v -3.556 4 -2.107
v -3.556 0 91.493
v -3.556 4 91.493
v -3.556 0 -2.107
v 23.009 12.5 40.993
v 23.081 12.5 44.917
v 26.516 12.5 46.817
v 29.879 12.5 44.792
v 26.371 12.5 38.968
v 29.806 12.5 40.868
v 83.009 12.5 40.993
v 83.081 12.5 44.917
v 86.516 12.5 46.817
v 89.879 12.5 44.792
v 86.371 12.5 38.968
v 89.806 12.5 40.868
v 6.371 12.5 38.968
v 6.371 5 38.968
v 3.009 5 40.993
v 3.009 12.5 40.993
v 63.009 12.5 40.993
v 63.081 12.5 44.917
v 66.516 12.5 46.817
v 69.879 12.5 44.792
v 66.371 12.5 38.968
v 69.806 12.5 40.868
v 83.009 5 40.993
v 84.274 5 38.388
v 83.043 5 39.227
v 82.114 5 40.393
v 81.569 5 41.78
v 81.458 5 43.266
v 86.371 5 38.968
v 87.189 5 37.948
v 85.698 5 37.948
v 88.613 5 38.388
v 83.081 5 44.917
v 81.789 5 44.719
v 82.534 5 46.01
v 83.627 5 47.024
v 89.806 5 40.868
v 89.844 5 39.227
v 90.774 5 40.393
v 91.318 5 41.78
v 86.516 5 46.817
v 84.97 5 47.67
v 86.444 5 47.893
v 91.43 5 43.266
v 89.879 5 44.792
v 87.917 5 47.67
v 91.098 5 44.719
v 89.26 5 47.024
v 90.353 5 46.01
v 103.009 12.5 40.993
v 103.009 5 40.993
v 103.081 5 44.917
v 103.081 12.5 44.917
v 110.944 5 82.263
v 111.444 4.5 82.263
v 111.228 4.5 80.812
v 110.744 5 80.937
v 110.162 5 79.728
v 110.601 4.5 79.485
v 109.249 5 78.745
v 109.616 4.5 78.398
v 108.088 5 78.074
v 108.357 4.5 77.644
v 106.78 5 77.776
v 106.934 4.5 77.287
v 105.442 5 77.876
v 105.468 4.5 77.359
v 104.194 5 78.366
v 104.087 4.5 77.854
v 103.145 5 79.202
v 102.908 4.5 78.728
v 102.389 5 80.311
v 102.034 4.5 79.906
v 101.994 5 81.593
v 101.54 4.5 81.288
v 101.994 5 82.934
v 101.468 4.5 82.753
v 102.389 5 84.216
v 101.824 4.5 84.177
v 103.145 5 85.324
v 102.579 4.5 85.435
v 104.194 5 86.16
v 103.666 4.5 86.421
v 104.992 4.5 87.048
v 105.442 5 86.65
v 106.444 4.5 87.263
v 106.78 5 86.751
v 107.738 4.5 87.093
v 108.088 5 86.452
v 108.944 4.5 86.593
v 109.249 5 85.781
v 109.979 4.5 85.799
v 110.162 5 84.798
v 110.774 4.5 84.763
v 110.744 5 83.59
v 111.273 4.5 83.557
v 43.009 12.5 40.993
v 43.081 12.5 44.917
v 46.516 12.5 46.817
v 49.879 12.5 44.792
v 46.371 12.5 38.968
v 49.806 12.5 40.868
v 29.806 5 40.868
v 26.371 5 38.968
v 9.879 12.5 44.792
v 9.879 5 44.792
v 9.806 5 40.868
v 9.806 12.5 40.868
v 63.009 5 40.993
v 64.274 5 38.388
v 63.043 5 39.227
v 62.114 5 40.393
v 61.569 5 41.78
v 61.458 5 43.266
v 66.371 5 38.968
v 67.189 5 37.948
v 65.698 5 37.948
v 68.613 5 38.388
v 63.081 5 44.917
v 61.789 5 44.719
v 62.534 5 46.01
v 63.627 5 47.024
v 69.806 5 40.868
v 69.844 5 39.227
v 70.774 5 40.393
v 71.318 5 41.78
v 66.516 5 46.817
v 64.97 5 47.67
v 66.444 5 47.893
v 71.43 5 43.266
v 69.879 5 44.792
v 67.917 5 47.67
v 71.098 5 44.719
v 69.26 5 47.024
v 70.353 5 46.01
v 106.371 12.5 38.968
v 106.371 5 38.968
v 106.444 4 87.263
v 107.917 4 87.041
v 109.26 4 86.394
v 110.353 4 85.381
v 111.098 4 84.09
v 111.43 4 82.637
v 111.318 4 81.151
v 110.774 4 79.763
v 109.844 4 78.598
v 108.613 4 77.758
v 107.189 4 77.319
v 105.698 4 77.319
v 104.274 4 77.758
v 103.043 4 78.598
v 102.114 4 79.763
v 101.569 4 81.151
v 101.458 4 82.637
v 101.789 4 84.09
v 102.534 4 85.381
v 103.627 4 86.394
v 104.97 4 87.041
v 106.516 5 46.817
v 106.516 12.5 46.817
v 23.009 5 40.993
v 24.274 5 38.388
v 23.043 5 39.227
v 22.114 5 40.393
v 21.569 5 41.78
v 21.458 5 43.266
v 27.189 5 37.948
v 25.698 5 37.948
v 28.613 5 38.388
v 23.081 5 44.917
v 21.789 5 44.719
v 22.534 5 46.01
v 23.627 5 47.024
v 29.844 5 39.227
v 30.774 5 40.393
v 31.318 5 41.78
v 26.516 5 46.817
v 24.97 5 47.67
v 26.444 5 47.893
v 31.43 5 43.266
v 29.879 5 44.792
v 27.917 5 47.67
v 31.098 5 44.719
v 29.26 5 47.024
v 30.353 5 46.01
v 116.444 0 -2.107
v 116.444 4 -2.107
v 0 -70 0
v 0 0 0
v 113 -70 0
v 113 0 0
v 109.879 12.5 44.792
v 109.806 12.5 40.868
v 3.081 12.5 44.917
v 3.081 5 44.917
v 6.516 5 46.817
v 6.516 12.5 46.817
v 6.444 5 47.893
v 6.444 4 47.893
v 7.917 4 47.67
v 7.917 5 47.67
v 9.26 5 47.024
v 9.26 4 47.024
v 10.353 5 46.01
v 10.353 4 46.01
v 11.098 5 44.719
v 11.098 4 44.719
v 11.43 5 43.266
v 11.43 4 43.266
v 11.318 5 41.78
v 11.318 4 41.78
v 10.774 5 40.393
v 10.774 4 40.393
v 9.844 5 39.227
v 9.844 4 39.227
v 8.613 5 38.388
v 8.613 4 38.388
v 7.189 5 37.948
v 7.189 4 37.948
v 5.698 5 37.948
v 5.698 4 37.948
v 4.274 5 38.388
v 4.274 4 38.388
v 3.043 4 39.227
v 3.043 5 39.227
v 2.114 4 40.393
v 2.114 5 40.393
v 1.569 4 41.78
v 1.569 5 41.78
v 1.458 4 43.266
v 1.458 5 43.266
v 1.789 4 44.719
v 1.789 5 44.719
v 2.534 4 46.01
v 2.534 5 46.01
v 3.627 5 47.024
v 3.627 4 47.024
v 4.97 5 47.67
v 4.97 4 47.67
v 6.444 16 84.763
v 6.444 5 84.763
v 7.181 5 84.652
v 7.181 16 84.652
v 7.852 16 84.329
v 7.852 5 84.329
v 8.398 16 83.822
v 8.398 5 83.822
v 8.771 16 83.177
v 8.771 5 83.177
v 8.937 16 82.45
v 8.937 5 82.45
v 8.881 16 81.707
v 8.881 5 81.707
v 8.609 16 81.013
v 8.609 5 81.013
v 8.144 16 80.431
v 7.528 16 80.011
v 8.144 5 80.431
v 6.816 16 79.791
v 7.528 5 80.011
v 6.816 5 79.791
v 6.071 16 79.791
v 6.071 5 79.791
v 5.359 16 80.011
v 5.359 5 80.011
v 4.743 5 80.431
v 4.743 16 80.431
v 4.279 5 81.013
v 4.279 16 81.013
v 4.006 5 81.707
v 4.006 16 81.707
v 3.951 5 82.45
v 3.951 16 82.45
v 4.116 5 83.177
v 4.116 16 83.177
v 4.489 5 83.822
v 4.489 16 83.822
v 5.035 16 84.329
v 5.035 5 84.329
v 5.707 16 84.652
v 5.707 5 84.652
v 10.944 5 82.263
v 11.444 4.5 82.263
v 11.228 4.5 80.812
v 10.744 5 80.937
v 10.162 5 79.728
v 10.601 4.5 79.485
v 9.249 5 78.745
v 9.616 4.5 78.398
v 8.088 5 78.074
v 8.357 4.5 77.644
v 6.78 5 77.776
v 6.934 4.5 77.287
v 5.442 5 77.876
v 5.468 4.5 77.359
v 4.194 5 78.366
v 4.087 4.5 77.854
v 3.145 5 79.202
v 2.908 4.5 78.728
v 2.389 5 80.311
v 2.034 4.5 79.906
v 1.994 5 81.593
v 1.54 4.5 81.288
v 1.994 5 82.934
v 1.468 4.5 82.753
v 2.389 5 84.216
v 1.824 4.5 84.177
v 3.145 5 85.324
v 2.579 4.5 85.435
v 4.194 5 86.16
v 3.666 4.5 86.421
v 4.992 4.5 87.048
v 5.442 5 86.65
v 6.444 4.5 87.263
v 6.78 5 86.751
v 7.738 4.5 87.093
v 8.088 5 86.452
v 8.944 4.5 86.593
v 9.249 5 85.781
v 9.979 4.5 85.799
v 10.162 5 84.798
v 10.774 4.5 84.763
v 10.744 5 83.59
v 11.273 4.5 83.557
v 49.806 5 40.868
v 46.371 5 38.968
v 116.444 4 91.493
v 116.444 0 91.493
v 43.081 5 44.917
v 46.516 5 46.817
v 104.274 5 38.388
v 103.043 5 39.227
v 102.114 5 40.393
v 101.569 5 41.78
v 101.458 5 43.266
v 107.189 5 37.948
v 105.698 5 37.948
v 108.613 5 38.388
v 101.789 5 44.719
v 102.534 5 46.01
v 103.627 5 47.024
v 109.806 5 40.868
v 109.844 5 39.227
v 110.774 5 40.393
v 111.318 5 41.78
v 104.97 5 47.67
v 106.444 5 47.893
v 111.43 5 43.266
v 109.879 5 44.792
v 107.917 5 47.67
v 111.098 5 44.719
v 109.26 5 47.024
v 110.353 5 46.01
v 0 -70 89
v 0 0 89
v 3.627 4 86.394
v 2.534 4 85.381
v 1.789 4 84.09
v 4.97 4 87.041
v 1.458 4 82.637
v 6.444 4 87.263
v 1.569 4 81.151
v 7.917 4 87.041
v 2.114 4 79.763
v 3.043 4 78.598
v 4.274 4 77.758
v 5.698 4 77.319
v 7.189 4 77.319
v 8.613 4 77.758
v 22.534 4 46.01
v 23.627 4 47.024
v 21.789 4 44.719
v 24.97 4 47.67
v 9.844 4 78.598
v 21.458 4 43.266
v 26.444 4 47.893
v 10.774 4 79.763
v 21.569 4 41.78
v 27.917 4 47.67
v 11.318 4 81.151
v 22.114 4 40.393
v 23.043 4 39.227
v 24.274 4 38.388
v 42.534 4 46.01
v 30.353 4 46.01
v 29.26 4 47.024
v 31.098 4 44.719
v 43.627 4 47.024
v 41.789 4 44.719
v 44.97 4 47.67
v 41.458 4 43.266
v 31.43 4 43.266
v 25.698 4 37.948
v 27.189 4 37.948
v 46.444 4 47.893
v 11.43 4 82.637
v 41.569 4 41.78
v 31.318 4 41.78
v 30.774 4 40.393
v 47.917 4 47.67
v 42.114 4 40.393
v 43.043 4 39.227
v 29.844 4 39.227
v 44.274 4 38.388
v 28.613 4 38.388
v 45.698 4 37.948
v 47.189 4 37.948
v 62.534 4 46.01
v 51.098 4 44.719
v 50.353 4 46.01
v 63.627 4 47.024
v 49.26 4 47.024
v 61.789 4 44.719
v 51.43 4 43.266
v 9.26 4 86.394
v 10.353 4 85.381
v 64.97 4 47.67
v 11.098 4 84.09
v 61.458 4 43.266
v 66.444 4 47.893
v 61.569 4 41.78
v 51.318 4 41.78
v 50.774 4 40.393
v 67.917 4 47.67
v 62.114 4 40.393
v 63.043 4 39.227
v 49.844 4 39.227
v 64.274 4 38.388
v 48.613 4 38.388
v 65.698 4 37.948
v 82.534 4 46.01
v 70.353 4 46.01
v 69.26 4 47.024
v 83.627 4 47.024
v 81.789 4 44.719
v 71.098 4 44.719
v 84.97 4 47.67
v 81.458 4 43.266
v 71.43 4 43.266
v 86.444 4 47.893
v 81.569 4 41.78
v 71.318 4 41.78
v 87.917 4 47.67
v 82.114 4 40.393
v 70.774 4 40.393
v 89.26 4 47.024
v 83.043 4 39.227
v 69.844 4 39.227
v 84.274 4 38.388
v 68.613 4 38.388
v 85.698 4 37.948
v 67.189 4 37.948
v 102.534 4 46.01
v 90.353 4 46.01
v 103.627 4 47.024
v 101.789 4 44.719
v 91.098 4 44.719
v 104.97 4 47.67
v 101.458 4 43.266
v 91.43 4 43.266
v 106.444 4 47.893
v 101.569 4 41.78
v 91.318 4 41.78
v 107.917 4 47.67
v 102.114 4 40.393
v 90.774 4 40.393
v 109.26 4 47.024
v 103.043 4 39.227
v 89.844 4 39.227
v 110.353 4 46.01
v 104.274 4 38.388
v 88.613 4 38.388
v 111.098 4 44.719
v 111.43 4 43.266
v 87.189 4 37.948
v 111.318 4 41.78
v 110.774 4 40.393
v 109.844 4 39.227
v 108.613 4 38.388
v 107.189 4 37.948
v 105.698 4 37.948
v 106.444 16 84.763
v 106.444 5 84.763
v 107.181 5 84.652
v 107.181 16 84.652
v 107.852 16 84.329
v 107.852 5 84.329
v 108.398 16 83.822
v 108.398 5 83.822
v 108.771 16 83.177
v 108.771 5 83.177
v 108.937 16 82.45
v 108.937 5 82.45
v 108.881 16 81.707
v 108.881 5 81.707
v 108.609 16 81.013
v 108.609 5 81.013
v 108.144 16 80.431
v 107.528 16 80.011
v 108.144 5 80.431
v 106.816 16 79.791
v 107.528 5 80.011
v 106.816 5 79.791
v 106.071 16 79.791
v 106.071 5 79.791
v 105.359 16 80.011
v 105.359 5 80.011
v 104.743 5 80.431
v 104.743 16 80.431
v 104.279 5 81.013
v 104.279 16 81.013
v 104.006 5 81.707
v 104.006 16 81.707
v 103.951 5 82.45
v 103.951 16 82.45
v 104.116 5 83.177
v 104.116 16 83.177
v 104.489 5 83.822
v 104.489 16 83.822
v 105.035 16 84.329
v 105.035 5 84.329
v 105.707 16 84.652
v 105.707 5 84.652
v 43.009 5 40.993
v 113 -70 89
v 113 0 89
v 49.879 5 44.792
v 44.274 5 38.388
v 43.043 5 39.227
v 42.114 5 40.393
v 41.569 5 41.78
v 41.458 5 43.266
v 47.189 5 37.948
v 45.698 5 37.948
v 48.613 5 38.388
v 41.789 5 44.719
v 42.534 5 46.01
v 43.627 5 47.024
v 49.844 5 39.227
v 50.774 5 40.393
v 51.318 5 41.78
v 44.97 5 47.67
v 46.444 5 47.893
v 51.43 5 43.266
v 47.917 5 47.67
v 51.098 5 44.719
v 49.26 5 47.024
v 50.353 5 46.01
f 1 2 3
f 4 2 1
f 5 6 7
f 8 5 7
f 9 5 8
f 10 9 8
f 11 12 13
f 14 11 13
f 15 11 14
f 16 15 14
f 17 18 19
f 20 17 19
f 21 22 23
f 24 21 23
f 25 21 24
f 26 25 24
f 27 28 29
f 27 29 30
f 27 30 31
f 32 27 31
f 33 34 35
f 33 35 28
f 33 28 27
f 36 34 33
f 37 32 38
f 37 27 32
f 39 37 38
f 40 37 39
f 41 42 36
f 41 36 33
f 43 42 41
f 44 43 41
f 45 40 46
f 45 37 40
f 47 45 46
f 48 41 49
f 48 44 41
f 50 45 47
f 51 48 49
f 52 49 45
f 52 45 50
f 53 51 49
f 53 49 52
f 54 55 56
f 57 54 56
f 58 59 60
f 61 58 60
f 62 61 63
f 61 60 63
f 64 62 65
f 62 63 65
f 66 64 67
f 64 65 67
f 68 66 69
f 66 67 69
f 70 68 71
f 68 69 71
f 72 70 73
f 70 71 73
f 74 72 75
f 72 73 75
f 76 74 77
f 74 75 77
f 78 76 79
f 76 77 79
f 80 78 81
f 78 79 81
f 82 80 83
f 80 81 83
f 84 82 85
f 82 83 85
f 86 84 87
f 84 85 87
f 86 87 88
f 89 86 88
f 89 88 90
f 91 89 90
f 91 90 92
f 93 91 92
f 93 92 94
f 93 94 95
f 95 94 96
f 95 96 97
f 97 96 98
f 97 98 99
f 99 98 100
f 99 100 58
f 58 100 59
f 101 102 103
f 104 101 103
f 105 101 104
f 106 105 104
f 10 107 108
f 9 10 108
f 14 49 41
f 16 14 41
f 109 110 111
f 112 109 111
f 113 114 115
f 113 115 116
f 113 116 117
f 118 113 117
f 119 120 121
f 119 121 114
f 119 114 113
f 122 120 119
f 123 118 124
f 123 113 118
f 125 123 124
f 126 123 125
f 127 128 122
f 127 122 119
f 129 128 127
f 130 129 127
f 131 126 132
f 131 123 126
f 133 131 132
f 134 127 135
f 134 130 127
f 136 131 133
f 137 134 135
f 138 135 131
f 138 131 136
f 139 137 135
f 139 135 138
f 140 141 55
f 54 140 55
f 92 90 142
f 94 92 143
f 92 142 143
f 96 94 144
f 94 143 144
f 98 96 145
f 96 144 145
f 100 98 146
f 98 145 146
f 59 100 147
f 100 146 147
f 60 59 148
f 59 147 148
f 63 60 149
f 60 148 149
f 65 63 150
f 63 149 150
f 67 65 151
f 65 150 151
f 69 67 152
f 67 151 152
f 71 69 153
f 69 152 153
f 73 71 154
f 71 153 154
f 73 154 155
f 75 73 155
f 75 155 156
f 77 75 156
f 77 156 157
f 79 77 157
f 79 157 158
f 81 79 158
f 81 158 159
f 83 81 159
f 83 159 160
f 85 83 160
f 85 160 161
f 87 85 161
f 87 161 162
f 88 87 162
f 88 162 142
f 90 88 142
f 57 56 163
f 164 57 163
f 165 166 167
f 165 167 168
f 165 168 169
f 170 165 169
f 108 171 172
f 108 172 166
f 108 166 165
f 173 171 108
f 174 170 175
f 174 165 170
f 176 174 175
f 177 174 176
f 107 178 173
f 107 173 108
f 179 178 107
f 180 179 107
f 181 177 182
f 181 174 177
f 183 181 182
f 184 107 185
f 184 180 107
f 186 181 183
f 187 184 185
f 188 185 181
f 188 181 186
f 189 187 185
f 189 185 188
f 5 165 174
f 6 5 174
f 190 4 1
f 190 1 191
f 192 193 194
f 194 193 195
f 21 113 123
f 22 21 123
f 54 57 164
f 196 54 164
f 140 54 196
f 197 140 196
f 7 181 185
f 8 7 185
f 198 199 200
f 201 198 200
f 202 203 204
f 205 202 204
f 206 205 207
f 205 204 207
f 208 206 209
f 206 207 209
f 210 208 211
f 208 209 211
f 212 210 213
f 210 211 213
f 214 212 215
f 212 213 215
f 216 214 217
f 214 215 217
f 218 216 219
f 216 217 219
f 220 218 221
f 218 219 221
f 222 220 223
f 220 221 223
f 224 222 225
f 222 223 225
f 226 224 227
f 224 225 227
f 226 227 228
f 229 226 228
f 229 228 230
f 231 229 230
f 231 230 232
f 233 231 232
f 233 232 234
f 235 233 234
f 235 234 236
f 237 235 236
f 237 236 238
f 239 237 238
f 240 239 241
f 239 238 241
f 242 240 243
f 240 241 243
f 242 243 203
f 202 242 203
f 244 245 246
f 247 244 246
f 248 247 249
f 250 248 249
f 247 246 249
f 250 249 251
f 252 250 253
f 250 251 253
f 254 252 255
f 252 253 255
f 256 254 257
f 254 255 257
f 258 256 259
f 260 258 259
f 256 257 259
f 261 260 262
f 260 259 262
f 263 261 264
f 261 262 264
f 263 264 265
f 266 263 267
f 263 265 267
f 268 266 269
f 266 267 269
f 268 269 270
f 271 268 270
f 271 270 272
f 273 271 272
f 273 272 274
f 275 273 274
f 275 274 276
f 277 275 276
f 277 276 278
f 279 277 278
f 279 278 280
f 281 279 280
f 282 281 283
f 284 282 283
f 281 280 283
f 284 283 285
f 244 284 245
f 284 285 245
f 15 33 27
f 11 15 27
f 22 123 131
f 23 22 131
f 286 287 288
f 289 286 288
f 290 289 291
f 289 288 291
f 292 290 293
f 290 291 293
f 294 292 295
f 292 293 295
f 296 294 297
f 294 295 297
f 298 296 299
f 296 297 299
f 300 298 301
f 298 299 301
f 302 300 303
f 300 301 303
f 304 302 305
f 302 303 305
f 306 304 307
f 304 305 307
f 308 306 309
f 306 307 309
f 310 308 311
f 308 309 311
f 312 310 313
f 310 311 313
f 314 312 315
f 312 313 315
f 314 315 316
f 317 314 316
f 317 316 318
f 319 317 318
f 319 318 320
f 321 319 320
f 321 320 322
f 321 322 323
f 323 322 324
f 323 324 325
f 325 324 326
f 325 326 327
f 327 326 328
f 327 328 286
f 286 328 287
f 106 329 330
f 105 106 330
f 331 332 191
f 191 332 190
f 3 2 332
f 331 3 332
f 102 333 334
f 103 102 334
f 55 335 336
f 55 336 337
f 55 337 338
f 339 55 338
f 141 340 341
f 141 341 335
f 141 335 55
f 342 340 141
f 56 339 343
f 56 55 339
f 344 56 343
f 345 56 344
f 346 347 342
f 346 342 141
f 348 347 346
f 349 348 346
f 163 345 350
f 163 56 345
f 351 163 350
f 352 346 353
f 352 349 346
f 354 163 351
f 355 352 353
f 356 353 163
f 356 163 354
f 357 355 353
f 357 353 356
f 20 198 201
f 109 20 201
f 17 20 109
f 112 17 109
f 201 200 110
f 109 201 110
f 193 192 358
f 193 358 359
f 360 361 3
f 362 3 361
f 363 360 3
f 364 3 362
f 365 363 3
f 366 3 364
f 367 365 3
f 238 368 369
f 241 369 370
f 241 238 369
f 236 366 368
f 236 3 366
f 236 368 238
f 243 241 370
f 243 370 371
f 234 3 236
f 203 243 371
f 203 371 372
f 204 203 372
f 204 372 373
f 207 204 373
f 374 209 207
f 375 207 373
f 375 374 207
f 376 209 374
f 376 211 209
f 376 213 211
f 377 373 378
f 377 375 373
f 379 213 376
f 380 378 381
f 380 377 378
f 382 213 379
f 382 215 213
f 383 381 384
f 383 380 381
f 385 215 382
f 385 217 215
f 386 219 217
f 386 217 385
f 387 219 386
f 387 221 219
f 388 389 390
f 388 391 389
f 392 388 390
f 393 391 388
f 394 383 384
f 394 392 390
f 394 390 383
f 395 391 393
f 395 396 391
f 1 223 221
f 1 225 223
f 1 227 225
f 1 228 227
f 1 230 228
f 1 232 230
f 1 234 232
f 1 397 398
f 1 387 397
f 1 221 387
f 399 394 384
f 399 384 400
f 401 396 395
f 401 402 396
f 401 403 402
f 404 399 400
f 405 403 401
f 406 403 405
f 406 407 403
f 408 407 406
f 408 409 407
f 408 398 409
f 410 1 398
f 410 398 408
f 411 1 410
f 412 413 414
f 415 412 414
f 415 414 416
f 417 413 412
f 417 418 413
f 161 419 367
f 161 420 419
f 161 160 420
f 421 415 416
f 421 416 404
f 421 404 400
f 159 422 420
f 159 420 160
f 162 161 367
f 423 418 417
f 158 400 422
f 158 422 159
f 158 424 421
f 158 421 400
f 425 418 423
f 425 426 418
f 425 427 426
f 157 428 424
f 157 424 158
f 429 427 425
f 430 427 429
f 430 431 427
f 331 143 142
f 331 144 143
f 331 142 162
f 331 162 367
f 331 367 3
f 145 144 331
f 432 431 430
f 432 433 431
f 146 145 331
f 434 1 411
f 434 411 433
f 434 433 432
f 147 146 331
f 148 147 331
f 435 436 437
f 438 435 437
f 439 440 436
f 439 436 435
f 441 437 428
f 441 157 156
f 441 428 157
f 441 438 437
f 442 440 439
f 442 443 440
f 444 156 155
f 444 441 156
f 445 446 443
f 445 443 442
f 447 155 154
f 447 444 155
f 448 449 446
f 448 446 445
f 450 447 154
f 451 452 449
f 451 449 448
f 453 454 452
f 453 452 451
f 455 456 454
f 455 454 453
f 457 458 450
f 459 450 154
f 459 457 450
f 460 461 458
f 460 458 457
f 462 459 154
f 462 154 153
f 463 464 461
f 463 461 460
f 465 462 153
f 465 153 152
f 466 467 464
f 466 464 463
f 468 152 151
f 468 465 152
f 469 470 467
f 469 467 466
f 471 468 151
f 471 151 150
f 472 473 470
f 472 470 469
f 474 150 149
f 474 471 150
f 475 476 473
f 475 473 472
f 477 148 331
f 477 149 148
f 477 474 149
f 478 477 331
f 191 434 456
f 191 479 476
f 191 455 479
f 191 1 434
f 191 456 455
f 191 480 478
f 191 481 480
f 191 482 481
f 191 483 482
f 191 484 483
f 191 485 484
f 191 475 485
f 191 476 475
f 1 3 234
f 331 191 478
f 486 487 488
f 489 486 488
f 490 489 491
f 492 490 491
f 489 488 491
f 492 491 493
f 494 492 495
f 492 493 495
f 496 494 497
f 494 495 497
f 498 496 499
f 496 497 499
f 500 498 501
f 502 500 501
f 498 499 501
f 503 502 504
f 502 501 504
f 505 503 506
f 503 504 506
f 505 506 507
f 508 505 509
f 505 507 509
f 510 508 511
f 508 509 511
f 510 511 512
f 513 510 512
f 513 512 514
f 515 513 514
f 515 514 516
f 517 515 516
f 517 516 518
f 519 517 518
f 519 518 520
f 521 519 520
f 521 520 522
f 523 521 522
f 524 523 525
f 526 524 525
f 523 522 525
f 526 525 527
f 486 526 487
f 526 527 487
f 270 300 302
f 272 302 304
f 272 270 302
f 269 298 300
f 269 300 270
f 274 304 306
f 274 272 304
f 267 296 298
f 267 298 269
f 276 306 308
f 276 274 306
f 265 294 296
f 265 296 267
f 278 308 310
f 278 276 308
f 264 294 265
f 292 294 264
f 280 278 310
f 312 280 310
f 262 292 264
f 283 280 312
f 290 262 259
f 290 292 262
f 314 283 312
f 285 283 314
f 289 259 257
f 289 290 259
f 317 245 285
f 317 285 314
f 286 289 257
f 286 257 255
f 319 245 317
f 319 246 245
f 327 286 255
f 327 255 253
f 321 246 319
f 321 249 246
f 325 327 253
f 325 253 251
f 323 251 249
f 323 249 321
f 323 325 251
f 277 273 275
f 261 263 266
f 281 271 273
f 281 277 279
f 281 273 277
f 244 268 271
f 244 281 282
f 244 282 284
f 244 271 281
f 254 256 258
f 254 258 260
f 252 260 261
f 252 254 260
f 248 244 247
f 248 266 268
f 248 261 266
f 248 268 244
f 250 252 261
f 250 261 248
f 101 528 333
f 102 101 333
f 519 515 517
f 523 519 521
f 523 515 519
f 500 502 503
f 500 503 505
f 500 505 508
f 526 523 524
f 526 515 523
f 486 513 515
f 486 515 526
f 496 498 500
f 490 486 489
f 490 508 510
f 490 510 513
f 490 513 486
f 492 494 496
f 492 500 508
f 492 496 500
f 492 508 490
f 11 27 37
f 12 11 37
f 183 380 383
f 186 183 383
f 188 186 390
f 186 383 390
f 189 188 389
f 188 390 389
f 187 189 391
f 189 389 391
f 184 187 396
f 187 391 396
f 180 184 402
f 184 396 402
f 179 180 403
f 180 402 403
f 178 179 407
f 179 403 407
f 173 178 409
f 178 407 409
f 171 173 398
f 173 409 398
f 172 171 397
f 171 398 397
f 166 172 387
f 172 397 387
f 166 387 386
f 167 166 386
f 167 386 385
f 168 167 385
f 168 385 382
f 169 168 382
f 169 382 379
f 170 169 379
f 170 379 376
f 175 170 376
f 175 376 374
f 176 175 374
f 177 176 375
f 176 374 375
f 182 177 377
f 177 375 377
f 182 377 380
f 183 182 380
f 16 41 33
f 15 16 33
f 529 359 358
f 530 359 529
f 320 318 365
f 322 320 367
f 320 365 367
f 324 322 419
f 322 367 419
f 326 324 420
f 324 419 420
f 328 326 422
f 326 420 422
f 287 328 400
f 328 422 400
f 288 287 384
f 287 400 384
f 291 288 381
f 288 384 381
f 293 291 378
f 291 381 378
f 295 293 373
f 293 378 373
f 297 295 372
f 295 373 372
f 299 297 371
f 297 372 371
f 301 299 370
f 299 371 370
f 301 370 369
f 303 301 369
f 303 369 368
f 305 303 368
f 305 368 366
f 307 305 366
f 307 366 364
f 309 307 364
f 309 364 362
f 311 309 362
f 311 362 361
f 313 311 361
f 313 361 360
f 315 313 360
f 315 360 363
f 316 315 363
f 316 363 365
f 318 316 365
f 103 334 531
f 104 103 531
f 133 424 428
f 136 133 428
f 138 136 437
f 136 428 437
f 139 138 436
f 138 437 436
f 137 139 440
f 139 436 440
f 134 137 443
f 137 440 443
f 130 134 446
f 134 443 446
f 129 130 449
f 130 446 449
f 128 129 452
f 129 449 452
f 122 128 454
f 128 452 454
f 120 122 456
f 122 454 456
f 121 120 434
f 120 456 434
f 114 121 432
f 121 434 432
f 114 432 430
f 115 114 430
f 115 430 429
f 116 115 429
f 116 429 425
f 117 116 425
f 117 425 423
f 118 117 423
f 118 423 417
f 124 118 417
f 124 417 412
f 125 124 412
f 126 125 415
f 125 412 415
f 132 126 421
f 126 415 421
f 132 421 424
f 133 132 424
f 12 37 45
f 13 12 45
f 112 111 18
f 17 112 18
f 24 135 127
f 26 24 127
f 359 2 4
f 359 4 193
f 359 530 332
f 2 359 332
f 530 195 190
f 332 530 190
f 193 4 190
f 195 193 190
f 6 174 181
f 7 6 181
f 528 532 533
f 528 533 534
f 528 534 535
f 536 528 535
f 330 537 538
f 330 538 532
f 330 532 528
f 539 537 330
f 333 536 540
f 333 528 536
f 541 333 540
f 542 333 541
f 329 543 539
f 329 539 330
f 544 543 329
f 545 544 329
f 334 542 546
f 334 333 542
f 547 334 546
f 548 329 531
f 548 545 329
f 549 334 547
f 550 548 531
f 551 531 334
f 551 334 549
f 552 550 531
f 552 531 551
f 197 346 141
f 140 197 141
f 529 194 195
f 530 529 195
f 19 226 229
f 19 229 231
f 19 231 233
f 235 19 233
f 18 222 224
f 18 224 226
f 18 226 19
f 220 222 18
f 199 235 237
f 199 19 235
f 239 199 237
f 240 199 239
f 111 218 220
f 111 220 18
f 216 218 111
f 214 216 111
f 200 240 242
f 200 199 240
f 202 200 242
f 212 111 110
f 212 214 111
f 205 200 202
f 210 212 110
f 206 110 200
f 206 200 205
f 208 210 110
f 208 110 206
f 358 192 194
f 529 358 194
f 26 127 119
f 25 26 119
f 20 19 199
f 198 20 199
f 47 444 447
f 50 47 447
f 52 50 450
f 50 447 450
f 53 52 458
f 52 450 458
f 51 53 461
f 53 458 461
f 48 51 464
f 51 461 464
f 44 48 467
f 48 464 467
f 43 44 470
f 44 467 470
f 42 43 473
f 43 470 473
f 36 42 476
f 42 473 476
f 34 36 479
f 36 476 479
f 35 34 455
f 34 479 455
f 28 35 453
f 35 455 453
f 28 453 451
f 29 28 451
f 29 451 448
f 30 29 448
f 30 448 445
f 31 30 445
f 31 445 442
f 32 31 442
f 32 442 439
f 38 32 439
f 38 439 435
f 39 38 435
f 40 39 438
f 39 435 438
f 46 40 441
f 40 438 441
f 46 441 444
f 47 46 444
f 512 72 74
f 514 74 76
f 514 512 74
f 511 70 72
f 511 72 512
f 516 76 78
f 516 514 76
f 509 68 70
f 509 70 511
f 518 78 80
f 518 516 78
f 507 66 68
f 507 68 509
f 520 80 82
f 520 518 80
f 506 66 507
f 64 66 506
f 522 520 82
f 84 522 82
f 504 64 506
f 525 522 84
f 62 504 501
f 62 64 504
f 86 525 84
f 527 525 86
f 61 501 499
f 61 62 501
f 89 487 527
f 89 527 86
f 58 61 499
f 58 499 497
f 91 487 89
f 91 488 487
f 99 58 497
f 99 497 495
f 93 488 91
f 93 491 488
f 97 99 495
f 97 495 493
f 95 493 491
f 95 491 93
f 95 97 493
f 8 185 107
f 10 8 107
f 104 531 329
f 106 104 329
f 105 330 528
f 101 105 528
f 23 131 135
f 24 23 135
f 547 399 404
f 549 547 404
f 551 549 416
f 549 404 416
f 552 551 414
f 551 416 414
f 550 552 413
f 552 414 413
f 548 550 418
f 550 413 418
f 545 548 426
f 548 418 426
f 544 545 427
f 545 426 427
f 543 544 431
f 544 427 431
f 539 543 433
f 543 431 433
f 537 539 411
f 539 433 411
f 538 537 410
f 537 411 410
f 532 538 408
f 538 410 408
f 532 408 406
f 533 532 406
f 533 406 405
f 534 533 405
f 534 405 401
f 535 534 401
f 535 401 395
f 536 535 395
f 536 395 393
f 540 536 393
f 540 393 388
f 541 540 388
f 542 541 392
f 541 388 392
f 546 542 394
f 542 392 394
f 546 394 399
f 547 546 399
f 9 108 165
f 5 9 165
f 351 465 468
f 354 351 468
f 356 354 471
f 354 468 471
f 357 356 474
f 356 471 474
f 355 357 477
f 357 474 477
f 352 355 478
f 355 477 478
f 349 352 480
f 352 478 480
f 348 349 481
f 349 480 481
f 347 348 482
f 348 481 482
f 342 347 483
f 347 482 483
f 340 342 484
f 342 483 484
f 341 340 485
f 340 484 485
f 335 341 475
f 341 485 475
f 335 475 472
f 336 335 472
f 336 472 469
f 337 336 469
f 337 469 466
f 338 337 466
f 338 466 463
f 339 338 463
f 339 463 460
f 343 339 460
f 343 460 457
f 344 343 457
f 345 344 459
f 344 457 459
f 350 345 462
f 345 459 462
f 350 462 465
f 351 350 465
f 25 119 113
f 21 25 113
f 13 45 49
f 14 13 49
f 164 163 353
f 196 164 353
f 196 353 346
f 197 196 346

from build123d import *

# Parameters (mm, degrees)
SKETCH2_W           = 113
SKETCH2_H           = 70
BOSS_EXTRUDE2_DEPTH = 89
SKETCH3_W           = 120
SKETCH3_H           = 93.6
BOSS_EXTRUDE3_DEPTH = 4
SKETCH5_R           = 5
BOSS_EXTRUDE4_DEPTH = 1
BOSS_EXTRUDE5_DEPTH = 7.5
SKETCH9_R           = 5
BOSS_EXTRUDE6_DEPTH = 1
SKETCH11_R          = 2.5
BOSS_EXTRUDE7_DEPTH = 11


with BuildPart() as part:
    # Sketch2 → Boss-Extrude2 (new body)
    with BuildSketch(Plane.XY):
        with Locations((56.5, -35)):
            Rectangle(SKETCH2_W, SKETCH2_H)
    extrude(amount=BOSS_EXTRUDE2_DEPTH)

    # Sketch3 → Boss-Extrude3 (add)
    with BuildSketch(Plane(origin=(0, 0, 0), x_dir=(1, 0, 0), z_dir=(0, 1, 0))):
        with Locations((56.443629761, -44.692561868)):
            Rectangle(SKETCH3_W, SKETCH3_H)
    extrude(amount=BOSS_EXTRUDE3_DEPTH)

    # Sketch5 → Boss-Extrude4 (add)
    with BuildSketch(Plane(origin=(0, 4, 0), x_dir=(1, 0, 0), z_dir=(0, 1, 0))):
        with Locations(Location((6.443629761, -42.892561868, 0), (0, 0, 270))):
            Circle(SKETCH5_R)
        with Locations(Location((26.443629761, -42.892561868, 0), (0, 0, 270))):
            Circle(SKETCH5_R)
        with Locations(Location((46.443629761, -42.892561868, 0), (0, 0, 270))):
            Circle(SKETCH5_R)
        with Locations(Location((66.443629761, -42.892561868, 0), (0, 0, 270))):
            Circle(SKETCH5_R)
        with Locations(Location((86.443629761, -42.892561868, 0), (0, 0, 270))):
            Circle(SKETCH5_R)
        with Locations(Location((106.443629761, -42.892561868, 0), (0, 0, 270))):
            Circle(SKETCH5_R)
    extrude(amount=BOSS_EXTRUDE4_DEPTH)

    # Sketch7 → Boss-Extrude5 (add)
    with BuildSketch(Plane(origin=(0, 5, 0), x_dir=(1, 0, 0), z_dir=(0, 1, 0))):
        Polygon((29.878505301, -44.792186338), (29.80619058, -40.867684626), (26.37131504, -38.968060156), (23.008754221, -40.992937397), (23.081068941, -44.917439109), (26.515944482, -46.81706358), align=None)
        Polygon((9.878505301, -44.792186338), (9.80619058, -40.867684626), (6.37131504, -38.968060156), (3.008754221, -40.992937397), (3.081068941, -44.917439109), (6.515944482, -46.81706358), align=None)
        Polygon((49.878505301, -44.792186338), (49.80619058, -40.867684626), (46.37131504, -38.968060156), (43.008754221, -40.992937397), (43.081068941, -44.917439109), (46.515944482, -46.81706358), align=None)
        Polygon((69.878505301, -44.792186338), (69.80619058, -40.867684626), (66.37131504, -38.968060156), (63.008754221, -40.992937397), (63.081068941, -44.917439109), (66.515944482, -46.81706358), align=None)
        Polygon((89.878505301, -44.792186338), (89.80619058, -40.867684626), (86.37131504, -38.968060156), (83.008754221, -40.992937397), (83.081068941, -44.917439109), (86.515944482, -46.81706358), align=None)
        Polygon((109.878505301, -44.792186338), (109.80619058, -40.867684626), (106.37131504, -38.968060156), (103.008754221, -40.992937397), (103.081068941, -44.917439109), (106.515944482, -46.81706358), align=None)
    extrude(amount=BOSS_EXTRUDE5_DEPTH)

    # Sketch9 → Boss-Extrude6 (add)
    with BuildSketch(Plane(origin=(0, 4, 0), x_dir=(1, 0, 0), z_dir=(0, 1, 0))):
        with Locations(Location((6.443629761, -82.263237169, 0), (0, 0, 270))):
            Circle(SKETCH9_R)
        with Locations(Location((106.443629761, -82.263237169, 0), (0, 0, 270))):
            Circle(SKETCH9_R)
    extrude(amount=BOSS_EXTRUDE6_DEPTH)

    # Fillet5: read off the stored shape, not the designer's step
    # Fillet5 outline → Fillet5 (revolve, cut)
    with BuildSketch(Plane(origin=(6.443629761, 0, 82.263237169), x_dir=(1, 0, 0), z_dir=(0, 0, 1))):
        Polygon((5, 5), (4.5, 5), (5, 4.5), align=None)
    revolve(axis=Axis((6.443629761, 0, 82.263237169), (0, 1, 0)), mode=Mode.SUBTRACT)

    # Fillet7: read off the stored shape, not the designer's step
    # Fillet7 outline → Fillet7 (revolve, cut)
    with BuildSketch(Plane(origin=(106.443629761, 0, 82.263237169), x_dir=(1, 0, 0), z_dir=(0, 0, 1))):
        Polygon((5, 5), (4.5, 5), (5, 4.5), align=None)
    revolve(axis=Axis((106.443629761, 0, 82.263237169), (0, 1, 0)), mode=Mode.SUBTRACT)

    # Sketch11 → Boss-Extrude7 (add)
    with BuildSketch(Plane(origin=(0, 5, 0), x_dir=(1, 0, 0), z_dir=(0, 1, 0))):
        with Locations(Location((6.443629761, -82.263237169, 0), (0, 0, 270))):
            Circle(SKETCH11_R)
        with Locations(Location((106.443629761, -82.263237169, 0), (0, 0, 270))):
            Circle(SKETCH11_R)
    extrude(amount=BOSS_EXTRUDE7_DEPTH)


solid = part.part
